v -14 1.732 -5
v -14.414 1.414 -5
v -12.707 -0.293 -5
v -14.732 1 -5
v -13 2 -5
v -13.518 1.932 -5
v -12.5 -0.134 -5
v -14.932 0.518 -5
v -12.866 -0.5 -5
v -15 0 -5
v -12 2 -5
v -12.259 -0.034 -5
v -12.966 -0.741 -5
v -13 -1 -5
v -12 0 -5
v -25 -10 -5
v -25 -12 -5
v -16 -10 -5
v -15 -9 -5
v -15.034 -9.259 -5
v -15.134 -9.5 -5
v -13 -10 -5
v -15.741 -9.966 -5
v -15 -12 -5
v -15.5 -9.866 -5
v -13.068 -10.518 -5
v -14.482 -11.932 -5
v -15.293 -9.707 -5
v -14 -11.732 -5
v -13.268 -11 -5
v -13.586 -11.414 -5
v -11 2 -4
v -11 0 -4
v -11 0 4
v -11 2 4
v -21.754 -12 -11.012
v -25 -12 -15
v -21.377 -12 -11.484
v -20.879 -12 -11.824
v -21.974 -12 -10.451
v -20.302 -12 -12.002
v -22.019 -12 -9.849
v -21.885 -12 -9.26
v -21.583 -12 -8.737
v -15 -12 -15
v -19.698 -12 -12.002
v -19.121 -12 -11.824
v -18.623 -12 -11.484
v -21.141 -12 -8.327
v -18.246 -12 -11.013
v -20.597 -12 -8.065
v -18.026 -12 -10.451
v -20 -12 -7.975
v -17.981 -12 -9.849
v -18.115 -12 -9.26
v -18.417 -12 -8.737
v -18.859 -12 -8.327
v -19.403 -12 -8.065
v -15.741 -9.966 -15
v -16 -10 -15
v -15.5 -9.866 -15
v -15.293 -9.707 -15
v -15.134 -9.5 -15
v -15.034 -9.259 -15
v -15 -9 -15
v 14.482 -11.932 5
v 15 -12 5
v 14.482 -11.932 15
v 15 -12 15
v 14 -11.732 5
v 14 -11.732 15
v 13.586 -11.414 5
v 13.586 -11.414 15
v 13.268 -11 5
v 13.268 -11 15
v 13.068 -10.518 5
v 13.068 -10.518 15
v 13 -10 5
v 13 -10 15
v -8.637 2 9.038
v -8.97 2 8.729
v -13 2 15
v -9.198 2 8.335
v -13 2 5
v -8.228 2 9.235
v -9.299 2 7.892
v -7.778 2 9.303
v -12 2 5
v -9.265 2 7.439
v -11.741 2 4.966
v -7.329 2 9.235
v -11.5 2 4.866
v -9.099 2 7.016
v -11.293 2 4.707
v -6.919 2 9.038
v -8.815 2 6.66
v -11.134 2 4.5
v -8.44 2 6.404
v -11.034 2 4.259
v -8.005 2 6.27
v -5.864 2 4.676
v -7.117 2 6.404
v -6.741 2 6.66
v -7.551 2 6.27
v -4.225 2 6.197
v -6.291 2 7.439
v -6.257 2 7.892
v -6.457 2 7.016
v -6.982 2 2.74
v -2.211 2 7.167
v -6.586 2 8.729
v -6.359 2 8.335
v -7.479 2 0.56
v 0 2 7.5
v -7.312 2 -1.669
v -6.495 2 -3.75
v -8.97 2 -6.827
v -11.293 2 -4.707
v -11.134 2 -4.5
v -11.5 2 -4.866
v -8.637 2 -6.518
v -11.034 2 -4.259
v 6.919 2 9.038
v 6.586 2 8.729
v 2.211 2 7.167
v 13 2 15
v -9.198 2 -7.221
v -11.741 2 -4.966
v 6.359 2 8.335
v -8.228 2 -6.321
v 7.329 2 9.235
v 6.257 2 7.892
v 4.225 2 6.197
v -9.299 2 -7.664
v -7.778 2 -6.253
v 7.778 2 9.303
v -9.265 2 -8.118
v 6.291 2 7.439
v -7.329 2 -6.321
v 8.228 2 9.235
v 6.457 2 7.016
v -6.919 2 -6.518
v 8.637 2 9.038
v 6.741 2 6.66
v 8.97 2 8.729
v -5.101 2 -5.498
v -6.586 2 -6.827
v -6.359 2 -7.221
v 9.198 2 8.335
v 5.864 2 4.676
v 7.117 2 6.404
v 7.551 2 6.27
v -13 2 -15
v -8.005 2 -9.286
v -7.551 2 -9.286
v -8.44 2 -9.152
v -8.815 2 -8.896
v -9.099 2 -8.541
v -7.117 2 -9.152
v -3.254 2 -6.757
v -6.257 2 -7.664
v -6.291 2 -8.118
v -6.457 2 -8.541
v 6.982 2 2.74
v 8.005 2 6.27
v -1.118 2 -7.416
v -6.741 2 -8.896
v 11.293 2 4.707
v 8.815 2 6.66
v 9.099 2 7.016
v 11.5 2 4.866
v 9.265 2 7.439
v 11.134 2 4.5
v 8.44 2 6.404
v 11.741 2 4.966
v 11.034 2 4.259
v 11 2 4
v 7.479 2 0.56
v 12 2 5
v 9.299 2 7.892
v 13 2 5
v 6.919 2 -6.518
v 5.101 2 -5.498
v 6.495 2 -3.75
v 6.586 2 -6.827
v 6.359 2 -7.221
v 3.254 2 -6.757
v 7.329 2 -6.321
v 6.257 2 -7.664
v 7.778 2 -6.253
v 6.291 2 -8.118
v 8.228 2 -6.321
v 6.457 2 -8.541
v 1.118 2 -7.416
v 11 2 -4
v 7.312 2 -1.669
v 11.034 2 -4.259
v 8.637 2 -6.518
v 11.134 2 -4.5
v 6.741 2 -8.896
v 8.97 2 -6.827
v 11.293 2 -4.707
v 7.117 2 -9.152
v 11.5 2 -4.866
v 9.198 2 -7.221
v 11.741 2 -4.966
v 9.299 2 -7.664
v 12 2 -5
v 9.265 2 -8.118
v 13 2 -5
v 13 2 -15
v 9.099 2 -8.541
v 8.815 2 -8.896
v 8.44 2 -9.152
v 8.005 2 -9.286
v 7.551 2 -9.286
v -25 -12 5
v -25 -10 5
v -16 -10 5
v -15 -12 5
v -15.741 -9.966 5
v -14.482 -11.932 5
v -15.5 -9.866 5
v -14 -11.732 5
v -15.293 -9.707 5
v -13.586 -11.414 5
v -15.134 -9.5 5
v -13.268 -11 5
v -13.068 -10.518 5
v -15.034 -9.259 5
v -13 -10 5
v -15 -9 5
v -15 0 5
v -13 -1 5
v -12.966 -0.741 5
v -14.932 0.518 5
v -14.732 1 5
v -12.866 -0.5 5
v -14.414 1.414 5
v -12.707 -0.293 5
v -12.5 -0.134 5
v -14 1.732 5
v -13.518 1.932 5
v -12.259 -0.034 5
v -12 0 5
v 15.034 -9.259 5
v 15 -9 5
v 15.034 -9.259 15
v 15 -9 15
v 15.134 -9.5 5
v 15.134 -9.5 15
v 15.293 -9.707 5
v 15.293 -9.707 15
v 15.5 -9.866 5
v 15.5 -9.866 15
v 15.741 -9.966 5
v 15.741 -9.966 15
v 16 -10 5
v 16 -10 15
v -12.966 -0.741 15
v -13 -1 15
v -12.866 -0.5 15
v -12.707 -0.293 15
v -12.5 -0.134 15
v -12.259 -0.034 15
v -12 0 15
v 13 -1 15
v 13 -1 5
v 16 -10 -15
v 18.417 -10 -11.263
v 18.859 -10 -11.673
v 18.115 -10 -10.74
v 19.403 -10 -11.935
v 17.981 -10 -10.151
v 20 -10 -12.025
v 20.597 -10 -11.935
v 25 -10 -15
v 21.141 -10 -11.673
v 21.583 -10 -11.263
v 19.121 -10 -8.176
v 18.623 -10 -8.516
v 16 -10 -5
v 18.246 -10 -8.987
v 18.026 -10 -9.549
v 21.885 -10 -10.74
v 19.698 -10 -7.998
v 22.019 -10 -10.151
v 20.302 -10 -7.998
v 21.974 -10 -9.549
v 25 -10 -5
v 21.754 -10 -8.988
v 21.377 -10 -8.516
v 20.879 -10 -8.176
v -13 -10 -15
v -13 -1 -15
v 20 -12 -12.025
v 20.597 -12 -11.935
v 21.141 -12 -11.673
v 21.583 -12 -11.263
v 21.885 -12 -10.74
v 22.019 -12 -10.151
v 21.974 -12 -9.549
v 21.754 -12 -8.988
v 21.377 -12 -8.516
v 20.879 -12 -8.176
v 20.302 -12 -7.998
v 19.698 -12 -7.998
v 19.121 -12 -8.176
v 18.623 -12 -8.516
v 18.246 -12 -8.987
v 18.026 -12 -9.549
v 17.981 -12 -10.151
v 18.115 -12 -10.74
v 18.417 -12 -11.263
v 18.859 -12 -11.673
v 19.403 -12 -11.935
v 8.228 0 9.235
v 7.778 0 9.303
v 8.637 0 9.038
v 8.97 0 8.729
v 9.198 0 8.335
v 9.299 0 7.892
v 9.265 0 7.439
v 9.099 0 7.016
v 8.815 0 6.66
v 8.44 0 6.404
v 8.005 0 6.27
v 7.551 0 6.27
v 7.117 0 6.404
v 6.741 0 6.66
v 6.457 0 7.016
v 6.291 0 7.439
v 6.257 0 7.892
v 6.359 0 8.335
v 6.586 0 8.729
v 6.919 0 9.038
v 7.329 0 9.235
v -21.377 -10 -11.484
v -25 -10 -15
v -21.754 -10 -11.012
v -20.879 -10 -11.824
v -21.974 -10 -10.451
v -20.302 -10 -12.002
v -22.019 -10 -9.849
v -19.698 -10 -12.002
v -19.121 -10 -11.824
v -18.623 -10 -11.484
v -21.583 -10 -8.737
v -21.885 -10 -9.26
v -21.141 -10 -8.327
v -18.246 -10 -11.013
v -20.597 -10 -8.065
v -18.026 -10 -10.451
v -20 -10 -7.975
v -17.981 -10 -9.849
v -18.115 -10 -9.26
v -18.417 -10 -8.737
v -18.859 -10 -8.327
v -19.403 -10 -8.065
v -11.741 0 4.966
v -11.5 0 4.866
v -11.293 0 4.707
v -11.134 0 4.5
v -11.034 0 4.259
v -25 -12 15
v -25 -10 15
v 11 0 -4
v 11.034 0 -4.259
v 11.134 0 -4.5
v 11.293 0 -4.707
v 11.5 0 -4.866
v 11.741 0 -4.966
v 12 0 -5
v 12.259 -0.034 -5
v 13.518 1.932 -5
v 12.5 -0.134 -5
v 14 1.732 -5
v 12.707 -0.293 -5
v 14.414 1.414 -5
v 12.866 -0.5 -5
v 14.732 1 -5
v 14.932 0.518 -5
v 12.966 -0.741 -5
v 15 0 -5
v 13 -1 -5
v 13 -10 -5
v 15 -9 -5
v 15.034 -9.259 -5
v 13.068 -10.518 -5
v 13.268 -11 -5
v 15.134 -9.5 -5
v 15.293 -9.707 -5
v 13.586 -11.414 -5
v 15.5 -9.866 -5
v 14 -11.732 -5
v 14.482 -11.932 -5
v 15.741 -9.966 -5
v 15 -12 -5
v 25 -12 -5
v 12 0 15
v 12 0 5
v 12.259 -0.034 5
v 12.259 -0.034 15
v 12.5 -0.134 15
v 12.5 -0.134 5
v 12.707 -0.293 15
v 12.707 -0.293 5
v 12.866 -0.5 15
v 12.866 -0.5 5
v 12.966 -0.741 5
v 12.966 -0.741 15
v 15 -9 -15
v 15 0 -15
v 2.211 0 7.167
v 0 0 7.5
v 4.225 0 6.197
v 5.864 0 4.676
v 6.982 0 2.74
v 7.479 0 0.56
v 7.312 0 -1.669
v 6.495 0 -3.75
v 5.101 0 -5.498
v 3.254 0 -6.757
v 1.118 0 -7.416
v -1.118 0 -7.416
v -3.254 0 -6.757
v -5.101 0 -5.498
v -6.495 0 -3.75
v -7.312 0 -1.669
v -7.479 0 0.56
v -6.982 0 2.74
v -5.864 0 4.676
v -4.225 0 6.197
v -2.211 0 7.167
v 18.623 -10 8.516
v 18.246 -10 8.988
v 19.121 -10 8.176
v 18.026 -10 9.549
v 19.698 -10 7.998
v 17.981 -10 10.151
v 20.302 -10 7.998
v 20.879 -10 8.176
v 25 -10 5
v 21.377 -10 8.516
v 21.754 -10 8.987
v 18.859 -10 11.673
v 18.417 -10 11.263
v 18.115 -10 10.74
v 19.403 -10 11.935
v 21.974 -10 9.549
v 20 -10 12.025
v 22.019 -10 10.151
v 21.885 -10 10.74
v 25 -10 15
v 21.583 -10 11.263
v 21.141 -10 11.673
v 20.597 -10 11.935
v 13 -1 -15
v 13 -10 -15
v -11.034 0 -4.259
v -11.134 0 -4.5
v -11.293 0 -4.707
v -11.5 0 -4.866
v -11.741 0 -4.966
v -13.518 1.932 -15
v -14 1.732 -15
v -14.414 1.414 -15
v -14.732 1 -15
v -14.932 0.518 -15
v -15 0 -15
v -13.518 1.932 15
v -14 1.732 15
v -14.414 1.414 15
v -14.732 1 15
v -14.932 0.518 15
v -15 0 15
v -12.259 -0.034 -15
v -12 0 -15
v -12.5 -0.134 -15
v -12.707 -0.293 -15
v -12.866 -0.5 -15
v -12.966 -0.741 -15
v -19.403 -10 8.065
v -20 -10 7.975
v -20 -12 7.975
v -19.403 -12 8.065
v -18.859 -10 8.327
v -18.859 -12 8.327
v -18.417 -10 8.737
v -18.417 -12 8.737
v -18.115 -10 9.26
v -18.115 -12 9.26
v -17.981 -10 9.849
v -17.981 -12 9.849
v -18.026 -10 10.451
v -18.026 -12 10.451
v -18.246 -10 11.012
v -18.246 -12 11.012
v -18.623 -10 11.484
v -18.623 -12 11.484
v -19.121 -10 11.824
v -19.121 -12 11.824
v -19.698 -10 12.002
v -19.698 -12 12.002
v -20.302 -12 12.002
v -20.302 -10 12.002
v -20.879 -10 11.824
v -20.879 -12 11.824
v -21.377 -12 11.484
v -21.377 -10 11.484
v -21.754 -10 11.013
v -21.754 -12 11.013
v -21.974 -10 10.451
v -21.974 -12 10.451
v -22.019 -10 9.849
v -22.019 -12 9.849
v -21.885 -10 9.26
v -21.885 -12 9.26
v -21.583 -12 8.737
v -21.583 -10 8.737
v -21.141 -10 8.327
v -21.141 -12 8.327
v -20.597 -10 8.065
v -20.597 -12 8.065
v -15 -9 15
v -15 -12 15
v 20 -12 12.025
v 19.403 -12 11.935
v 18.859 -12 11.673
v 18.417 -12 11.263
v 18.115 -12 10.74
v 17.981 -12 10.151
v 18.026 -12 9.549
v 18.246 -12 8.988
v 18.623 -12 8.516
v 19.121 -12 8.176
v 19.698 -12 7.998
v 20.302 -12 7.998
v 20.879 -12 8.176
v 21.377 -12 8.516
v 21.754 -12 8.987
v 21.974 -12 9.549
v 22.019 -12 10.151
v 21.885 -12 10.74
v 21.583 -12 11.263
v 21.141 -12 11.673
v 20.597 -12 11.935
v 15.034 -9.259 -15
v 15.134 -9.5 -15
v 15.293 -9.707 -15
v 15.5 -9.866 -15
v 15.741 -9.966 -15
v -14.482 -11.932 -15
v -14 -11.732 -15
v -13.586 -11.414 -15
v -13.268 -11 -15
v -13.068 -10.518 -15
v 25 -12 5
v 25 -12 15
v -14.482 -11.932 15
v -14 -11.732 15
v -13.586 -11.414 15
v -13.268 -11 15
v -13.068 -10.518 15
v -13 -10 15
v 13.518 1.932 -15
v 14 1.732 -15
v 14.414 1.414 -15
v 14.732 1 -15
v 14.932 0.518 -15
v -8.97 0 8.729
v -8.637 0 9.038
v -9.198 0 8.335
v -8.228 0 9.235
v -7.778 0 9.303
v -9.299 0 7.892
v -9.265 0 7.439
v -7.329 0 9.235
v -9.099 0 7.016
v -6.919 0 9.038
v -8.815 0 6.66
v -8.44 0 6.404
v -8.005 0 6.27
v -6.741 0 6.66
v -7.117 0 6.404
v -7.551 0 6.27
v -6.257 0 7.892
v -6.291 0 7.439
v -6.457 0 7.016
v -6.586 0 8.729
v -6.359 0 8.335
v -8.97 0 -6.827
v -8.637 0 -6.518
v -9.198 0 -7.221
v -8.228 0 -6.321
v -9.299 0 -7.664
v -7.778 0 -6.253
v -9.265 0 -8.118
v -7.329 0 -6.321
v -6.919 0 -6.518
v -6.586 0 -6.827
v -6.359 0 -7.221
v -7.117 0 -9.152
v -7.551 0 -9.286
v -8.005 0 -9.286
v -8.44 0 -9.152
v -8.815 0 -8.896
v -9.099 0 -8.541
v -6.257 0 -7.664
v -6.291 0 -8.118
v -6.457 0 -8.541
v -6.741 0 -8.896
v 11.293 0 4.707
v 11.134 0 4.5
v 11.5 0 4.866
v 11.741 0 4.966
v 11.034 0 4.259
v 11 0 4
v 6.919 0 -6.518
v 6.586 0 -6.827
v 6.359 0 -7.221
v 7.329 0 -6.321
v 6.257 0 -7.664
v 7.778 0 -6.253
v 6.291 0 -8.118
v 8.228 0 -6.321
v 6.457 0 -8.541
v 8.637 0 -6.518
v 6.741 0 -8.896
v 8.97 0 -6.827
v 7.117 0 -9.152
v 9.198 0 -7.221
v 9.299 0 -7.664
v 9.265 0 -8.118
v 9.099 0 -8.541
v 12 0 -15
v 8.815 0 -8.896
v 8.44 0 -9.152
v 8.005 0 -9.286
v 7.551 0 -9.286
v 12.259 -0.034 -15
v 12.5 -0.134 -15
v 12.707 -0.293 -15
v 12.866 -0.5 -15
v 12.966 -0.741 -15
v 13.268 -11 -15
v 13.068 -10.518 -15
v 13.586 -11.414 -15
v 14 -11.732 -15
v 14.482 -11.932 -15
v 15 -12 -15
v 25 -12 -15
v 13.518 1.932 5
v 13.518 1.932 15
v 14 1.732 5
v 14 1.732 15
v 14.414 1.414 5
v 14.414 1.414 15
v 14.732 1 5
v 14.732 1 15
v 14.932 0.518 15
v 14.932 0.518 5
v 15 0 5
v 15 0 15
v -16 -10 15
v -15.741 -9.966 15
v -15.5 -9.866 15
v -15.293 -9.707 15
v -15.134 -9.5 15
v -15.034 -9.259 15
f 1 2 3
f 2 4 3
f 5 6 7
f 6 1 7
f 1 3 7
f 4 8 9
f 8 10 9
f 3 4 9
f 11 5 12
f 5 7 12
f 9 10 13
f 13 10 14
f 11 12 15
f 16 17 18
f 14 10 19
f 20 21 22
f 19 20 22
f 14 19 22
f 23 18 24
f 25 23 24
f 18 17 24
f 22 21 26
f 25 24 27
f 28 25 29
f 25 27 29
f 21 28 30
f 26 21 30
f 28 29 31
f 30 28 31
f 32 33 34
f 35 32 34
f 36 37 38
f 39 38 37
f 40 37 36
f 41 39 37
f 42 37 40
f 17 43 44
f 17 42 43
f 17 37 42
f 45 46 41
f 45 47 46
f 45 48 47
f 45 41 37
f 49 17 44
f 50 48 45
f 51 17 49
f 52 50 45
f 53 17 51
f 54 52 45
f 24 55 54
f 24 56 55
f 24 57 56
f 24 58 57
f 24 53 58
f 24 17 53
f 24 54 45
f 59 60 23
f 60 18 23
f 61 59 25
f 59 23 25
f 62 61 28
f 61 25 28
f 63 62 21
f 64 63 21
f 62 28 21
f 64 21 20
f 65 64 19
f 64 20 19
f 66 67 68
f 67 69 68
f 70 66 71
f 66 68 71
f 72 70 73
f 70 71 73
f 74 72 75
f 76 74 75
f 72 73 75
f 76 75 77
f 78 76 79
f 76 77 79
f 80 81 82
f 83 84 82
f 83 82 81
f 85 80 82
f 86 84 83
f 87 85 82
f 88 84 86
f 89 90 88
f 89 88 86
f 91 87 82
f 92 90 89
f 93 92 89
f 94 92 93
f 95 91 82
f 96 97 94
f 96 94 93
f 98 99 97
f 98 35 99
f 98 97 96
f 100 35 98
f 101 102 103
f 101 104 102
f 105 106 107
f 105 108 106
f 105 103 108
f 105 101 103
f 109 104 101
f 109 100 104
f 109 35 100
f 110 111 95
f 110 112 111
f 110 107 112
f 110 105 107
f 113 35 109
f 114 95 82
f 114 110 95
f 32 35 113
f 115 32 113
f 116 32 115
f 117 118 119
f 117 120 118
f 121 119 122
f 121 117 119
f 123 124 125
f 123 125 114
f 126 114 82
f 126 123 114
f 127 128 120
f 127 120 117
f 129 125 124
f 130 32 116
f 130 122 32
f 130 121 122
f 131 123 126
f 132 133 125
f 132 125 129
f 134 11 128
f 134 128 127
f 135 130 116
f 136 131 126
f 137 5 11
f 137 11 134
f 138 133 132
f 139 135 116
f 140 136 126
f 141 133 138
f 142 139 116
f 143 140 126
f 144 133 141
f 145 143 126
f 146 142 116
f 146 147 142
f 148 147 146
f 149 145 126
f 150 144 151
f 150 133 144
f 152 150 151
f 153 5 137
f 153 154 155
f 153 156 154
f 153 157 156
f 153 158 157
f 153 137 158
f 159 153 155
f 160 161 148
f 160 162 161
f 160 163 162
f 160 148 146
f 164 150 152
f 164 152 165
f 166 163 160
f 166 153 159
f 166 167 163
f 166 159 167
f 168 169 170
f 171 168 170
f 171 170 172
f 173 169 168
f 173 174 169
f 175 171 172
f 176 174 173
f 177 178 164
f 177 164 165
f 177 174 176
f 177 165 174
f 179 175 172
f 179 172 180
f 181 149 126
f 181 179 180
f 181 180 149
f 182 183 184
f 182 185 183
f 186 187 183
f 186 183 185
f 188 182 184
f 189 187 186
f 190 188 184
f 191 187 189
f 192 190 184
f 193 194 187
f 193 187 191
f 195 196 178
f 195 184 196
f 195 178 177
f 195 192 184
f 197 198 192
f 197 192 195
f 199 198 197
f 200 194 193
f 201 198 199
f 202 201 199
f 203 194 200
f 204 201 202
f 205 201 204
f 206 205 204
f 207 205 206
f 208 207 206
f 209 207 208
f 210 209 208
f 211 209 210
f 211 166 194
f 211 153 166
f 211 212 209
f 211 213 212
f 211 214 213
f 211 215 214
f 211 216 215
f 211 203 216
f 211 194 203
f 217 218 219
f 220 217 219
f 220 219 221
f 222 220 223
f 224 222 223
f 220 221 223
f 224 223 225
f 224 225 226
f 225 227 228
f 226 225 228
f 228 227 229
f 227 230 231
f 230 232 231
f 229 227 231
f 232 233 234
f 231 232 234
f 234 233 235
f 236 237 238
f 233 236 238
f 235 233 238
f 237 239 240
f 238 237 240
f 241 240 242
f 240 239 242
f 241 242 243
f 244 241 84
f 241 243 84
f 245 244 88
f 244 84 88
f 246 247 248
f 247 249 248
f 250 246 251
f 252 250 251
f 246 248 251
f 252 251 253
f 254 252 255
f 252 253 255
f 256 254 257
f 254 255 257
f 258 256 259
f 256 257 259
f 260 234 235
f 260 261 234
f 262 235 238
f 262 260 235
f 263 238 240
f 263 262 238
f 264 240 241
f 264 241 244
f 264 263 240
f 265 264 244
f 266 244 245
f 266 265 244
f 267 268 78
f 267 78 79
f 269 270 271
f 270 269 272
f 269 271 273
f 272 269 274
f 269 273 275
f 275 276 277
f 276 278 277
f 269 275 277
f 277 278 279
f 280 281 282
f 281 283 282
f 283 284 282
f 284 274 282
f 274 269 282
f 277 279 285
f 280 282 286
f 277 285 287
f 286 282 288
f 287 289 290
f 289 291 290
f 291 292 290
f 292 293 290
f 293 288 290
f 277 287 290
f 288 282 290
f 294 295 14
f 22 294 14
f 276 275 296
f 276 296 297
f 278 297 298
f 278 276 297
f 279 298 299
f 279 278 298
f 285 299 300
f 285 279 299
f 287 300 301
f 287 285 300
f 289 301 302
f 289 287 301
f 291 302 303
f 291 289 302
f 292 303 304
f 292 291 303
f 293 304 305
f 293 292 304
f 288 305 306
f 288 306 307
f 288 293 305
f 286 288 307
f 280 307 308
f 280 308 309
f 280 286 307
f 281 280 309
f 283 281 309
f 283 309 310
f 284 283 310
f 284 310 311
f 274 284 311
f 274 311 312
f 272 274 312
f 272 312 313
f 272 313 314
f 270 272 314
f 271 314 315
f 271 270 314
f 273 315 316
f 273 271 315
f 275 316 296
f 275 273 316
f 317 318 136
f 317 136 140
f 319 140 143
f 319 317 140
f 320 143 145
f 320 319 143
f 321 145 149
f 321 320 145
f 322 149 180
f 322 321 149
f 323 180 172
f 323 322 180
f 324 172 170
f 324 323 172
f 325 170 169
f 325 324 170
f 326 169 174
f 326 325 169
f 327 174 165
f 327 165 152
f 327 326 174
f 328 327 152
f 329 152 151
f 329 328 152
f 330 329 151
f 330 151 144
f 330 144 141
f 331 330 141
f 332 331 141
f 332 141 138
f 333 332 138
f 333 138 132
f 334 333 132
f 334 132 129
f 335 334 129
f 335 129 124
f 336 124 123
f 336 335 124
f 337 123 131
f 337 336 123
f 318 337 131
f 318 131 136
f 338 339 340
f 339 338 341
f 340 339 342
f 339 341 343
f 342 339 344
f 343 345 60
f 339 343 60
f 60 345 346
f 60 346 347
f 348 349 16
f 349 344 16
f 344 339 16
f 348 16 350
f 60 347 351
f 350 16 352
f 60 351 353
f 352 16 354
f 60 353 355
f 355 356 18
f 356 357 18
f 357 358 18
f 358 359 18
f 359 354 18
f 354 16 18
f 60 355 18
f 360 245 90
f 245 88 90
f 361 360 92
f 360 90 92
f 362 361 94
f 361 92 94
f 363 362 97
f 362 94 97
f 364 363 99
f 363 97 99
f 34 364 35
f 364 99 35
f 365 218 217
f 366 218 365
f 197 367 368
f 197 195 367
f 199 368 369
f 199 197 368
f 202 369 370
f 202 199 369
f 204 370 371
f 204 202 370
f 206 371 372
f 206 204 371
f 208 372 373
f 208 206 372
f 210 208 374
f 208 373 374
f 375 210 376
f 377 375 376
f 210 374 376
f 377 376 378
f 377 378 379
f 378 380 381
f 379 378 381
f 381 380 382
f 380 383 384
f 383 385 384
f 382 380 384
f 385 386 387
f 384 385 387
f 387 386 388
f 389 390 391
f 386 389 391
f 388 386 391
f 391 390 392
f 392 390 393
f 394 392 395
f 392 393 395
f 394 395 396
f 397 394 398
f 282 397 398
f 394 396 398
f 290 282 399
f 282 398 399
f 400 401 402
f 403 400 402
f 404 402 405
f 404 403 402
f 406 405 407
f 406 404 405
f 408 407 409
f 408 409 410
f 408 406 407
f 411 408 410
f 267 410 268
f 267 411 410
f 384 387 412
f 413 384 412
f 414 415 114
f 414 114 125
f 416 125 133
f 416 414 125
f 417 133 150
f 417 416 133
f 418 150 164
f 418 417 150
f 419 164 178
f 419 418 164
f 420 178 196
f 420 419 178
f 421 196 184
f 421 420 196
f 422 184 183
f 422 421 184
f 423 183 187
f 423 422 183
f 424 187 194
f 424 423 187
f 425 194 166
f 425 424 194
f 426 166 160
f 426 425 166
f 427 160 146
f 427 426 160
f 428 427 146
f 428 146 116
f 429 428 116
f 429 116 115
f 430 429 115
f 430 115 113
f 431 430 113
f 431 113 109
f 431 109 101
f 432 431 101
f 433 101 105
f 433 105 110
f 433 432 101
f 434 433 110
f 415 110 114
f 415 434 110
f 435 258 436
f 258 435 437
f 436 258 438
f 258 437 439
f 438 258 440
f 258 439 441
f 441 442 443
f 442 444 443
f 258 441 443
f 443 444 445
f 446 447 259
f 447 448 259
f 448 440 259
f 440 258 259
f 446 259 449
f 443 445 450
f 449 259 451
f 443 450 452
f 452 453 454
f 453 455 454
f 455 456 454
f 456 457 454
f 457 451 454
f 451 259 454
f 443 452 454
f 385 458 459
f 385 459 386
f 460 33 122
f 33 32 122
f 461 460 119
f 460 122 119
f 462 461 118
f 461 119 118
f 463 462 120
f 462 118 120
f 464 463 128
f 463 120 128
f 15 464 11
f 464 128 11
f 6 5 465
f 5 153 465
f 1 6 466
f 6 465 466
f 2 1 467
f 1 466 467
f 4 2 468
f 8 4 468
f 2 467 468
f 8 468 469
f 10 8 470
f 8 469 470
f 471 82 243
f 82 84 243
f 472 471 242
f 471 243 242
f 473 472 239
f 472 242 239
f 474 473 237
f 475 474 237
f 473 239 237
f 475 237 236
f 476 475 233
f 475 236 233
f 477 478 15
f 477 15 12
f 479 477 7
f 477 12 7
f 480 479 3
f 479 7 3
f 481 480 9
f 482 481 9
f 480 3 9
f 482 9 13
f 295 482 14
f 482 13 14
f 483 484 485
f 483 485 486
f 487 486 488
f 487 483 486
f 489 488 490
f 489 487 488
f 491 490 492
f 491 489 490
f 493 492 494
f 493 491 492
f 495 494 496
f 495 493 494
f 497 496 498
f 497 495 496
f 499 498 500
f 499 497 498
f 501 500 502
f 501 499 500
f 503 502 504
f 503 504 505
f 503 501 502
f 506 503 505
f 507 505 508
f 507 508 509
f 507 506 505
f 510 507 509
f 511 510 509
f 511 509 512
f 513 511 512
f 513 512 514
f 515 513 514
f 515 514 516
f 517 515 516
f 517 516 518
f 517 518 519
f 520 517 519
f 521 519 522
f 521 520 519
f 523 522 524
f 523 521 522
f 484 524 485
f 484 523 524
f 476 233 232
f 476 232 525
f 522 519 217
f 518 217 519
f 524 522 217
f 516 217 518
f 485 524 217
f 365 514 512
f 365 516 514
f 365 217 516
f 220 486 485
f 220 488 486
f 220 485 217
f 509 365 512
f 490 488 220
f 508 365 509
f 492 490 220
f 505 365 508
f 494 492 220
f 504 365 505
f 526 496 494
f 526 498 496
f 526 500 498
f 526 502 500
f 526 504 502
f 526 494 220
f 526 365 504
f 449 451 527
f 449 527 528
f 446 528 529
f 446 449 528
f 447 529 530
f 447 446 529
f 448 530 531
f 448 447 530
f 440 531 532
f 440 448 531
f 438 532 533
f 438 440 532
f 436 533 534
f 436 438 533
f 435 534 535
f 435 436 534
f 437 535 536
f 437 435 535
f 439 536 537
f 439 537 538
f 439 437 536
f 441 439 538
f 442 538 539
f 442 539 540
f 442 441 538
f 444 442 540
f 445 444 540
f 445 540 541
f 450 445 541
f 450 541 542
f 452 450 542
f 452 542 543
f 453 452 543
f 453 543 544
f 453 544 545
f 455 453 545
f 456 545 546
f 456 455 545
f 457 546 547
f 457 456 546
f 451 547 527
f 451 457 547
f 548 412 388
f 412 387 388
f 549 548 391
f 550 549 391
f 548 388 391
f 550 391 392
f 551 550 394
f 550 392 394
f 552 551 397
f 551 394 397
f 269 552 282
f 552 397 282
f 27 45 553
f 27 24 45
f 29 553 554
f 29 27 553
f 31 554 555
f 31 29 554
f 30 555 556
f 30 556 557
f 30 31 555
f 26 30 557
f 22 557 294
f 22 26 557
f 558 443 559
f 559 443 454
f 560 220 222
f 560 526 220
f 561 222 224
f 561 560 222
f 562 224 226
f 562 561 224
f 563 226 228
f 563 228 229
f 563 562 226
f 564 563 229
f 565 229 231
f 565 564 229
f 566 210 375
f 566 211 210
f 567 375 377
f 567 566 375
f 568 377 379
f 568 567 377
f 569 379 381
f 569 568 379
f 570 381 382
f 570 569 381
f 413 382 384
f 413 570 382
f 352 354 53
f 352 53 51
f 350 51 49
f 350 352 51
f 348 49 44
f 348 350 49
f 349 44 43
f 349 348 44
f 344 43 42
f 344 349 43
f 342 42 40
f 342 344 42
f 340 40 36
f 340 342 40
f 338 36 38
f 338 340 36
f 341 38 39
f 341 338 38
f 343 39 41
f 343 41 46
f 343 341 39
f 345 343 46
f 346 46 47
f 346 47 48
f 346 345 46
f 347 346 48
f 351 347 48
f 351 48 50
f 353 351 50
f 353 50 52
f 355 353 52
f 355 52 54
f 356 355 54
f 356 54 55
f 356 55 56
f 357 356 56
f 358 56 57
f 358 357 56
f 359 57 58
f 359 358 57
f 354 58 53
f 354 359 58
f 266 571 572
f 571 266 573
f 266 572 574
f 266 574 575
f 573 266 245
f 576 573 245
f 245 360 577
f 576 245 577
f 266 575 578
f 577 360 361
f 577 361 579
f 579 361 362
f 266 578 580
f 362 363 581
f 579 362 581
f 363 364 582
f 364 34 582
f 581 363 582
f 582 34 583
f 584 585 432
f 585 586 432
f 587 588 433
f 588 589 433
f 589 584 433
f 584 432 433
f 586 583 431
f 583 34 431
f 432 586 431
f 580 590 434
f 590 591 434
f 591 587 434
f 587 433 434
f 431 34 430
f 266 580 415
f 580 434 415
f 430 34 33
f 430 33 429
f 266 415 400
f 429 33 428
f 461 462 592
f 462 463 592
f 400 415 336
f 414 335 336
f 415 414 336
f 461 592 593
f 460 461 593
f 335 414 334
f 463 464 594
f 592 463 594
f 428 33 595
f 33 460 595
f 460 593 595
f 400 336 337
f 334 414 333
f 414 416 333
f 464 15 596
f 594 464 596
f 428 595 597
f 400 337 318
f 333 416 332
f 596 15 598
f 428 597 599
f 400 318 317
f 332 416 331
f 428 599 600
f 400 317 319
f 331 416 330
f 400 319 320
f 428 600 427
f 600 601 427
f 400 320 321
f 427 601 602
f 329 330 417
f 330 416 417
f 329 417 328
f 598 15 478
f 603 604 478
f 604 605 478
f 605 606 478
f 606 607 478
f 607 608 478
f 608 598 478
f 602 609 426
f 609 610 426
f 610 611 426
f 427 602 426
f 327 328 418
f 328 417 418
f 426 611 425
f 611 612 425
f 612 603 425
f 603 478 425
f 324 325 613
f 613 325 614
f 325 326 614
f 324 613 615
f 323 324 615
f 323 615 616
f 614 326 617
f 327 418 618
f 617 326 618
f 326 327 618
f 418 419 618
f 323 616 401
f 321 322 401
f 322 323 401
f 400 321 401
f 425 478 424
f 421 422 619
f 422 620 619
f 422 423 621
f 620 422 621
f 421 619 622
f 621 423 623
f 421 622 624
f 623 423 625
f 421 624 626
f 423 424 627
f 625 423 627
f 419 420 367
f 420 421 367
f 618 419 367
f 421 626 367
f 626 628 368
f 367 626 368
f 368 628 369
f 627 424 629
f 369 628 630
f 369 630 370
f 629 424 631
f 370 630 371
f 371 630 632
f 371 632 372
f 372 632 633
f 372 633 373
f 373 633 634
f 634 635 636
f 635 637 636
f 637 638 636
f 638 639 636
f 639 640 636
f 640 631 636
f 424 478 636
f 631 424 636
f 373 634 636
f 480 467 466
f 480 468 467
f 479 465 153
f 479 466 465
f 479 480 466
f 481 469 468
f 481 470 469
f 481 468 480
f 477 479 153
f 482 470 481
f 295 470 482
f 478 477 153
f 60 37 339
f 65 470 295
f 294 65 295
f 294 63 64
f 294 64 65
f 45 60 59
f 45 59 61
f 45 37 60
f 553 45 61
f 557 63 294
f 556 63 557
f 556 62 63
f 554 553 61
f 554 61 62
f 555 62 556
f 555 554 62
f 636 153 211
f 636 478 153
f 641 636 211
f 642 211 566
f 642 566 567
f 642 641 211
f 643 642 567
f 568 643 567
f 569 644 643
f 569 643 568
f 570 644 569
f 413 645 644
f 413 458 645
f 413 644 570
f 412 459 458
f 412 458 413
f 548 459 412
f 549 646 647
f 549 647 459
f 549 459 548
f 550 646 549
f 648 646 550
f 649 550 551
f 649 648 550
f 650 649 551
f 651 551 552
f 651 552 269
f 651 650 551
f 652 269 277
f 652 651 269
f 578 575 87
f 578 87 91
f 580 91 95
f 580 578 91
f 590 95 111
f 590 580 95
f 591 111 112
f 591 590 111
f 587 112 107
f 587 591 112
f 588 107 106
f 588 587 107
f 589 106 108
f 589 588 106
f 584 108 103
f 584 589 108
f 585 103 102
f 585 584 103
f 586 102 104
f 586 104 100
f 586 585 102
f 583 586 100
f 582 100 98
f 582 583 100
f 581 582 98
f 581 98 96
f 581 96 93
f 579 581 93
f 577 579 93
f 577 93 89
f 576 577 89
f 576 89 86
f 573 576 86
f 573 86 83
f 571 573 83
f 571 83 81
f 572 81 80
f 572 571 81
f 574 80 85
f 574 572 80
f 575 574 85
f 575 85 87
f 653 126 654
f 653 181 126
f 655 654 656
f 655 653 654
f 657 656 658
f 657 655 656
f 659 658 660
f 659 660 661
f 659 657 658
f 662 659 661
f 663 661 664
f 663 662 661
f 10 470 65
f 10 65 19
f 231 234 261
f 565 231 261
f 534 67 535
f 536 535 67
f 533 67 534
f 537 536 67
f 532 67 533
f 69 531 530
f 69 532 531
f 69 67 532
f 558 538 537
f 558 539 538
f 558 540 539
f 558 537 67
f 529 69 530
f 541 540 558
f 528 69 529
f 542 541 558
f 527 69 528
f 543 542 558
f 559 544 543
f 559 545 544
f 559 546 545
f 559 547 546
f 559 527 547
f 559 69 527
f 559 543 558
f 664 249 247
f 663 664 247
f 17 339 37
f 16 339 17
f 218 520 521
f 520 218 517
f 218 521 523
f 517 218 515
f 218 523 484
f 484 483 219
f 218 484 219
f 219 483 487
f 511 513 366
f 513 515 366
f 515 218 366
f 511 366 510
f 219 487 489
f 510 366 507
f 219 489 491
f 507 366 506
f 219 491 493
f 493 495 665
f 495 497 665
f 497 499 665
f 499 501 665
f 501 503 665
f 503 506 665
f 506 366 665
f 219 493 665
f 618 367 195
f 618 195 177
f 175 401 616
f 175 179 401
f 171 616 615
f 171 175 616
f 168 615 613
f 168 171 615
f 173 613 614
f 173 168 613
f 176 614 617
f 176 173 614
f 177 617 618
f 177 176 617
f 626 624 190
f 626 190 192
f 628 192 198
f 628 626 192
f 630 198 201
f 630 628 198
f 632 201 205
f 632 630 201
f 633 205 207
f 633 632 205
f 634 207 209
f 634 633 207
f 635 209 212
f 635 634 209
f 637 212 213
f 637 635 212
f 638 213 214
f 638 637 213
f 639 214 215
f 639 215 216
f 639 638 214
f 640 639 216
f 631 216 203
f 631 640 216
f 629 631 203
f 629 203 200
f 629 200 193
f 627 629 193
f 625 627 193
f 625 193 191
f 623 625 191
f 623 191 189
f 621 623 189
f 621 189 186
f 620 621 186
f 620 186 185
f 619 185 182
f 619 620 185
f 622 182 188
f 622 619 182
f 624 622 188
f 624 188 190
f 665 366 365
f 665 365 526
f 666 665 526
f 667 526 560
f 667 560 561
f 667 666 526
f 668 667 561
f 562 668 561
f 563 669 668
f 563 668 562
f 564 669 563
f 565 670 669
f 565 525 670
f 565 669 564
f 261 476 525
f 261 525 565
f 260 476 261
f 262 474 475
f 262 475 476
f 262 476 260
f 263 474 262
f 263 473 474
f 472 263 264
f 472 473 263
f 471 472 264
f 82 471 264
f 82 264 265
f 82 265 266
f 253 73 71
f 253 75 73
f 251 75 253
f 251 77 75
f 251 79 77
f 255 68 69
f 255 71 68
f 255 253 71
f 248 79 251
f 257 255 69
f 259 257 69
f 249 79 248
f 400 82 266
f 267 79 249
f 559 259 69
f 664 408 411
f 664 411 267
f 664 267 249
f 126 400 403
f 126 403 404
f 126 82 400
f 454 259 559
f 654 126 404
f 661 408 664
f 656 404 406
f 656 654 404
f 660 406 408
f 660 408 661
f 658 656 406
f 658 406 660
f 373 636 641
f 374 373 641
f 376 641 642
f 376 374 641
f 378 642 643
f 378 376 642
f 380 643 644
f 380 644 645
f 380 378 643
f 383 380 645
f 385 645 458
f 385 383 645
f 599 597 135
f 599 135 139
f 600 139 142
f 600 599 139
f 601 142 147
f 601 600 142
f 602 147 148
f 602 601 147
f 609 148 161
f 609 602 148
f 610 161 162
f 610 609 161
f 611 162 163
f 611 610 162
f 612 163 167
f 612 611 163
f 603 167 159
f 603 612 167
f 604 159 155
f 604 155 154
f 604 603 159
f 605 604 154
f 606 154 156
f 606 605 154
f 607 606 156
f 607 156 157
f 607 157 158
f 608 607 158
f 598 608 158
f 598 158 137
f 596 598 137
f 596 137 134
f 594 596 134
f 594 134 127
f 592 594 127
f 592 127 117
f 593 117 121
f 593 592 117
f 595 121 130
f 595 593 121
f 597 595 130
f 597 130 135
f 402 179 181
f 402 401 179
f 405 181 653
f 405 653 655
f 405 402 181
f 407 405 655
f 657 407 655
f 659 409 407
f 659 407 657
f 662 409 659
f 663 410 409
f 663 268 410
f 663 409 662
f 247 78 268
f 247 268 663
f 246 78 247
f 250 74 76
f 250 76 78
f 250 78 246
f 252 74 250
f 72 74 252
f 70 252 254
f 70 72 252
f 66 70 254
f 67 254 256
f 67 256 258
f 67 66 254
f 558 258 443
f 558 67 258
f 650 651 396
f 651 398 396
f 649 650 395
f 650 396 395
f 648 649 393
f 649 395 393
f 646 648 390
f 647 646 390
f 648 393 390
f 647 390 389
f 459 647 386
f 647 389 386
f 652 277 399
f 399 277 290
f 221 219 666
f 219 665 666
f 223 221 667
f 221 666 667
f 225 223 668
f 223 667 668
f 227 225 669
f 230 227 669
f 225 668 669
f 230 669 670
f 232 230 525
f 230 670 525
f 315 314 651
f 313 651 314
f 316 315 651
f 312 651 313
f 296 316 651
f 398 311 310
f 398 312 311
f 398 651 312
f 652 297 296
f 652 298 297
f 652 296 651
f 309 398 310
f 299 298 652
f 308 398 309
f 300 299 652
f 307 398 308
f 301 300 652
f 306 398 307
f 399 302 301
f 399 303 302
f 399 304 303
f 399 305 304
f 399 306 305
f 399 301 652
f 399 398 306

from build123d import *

# Parameters (mm, degrees)
SKETCH1_W           = 30
SKETCH1_H           = 30
SKETCH1_R           = 7.5
SKETCH1_R_2         = 1.525
BOSS_EXTRUDE1_DEPTH = 2
SKETCH3_W           = 2
SKETCH3_H           = 10
BOSS_EXTRUDE2_DEPTH = 10
SKETCH4_W           = 12
SKETCH4_H           = 10
SKETCH4_R           = 2.025
BOSS_EXTRUDE3_DEPTH = 2
SKETCH5_W           = 4
SKETCH5_H           = 10
CUT_EXTRUDE1_DEPTH  = 32.527765541
FILLET1_R           = 2
FILLET2_R           = 1
FILLET3_R           = 1


with BuildPart() as part:
    # Sketch1 → Boss-Extrude1 (new body)
    with BuildSketch(Plane(origin=(0, 0, 0), x_dir=(1, 0, 0), z_dir=(0, 1, 0))):
        Rectangle(SKETCH1_W, SKETCH1_H)
        with Locations(Location((0, 0, 0), (0, 0, 270))):
            Circle(SKETCH1_R, mode=Mode.SUBTRACT)
        with Locations(Location((-7.778174593, 7.778174593, 0), (0, 0, 270))):
            Circle(SKETCH1_R_2, mode=Mode.SUBTRACT)
        with Locations(Location((7.778174593, 7.778174593, 0), (0, 0, 270))):
            Circle(SKETCH1_R_2, mode=Mode.SUBTRACT)
        with Locations(Location((-7.778174593, -7.778174593, 0), (0, 0, 270))):
            Circle(SKETCH1_R_2, mode=Mode.SUBTRACT)
        with Locations(Location((7.778174593, -7.778174593, 0), (0, 0, 270))):
            Circle(SKETCH1_R_2, mode=Mode.SUBTRACT)
    extrude(amount=BOSS_EXTRUDE1_DEPTH)

    # Sketch3 → Boss-Extrude2 (add)
    with BuildSketch(Plane.XZ):
        with Locations((-14, 10)):
            Rectangle(SKETCH3_W, SKETCH3_H)
        with Locations((14, 10)):
            Rectangle(SKETCH3_W, SKETCH3_H)
        with Locations((14, -10)):
            Rectangle(SKETCH3_W, SKETCH3_H)
        with Locations((-14, -10)):
            Rectangle(SKETCH3_W, SKETCH3_H)
    extrude(amount=BOSS_EXTRUDE2_DEPTH)

    # Sketch4 → Boss-Extrude3 (add)
    # profile 1 of 4: a face of its own
    with BuildSketch(Plane.XZ.offset(10)):
        with Locations((-19, 10)):
            Rectangle(SKETCH4_W, SKETCH4_H)
        with Locations(Location((-20, 10, 0), (0, 0, 270))):
            Circle(SKETCH4_R, mode=Mode.SUBTRACT)
    # profile 2 of 4: a face of its own
    with BuildSketch(Plane.XZ.offset(10)):
        with Locations((19, 10)):
            Rectangle(SKETCH4_W, SKETCH4_H)
        with Locations(Location((20, 10, 0), (0, 0, 90))):
            Circle(SKETCH4_R, mode=Mode.SUBTRACT)
    # profile 3 of 4: a face of its own
    with BuildSketch(Plane.XZ.offset(10)):
        with Locations((19, -10)):
            Rectangle(SKETCH4_W, SKETCH4_H)
        with Locations(Location((20, -10, 0), (0, 0, 270))):
            Circle(SKETCH4_R, mode=Mode.SUBTRACT)
    # profile 4 of 4: a face of its own
    with BuildSketch(Plane.XZ.offset(10)):
        with Locations((-19, -10)):
            Rectangle(SKETCH4_W, SKETCH4_H)
        with Locations(Location((-20, -10, 0), (0, 0, 90))):
            Circle(SKETCH4_R, mode=Mode.SUBTRACT)
    extrude(amount=BOSS_EXTRUDE3_DEPTH)

    # Sketch5 → Cut-Extrude1 (cut, through all)
    with BuildSketch(Plane.XZ):
        with Locations((-13, 0)):
            Rectangle(SKETCH5_W, SKETCH5_H)
        with Locations((13, 0)):
            Rectangle(SKETCH5_W, SKETCH5_H)
    extrude(amount=-CUT_EXTRUDE1_DEPTH, mode=Mode.SUBTRACT)

    # Fillet1
    fillet1_edges = [part.edges().sort_by_distance(p)[0] for p in [
        (13, -12, -10),
        (-13, -12, -10),
        (-15, 2, -10),
        (-15, 2, 10),
        (15, 2, -10),
        (15, 2, 10),
        (-13, -12, 10),
        (13, -12, 10),
    ]]
    fillet(fillet1_edges, radius=FILLET1_R)

    # Fillet2
    fillet2_edges = [part.edges().sort_by_distance(p)[0] for p in [
        (-13, 0, 10),
        (-15, -10, 10),
        (13, 0, 10),
        (15, -10, 10),
        (13, 0, -10),
        (15, -10, -10),
        (-13, 0, -10),
        (-15, -10, -10),
    ]]
    fillet(fillet2_edges, radius=FILLET2_R)

    # Fillet3
    fillet3_edges = [part.edges().sort_by_distance(p)[0] for p in [
        (-11, 1, -5),
        (11, 1, -5),
        (11, 1, 5),
        (-11, 1, 5),
    ]]
    fillet(fillet3_edges, radius=FILLET3_R)


solid = part.part
